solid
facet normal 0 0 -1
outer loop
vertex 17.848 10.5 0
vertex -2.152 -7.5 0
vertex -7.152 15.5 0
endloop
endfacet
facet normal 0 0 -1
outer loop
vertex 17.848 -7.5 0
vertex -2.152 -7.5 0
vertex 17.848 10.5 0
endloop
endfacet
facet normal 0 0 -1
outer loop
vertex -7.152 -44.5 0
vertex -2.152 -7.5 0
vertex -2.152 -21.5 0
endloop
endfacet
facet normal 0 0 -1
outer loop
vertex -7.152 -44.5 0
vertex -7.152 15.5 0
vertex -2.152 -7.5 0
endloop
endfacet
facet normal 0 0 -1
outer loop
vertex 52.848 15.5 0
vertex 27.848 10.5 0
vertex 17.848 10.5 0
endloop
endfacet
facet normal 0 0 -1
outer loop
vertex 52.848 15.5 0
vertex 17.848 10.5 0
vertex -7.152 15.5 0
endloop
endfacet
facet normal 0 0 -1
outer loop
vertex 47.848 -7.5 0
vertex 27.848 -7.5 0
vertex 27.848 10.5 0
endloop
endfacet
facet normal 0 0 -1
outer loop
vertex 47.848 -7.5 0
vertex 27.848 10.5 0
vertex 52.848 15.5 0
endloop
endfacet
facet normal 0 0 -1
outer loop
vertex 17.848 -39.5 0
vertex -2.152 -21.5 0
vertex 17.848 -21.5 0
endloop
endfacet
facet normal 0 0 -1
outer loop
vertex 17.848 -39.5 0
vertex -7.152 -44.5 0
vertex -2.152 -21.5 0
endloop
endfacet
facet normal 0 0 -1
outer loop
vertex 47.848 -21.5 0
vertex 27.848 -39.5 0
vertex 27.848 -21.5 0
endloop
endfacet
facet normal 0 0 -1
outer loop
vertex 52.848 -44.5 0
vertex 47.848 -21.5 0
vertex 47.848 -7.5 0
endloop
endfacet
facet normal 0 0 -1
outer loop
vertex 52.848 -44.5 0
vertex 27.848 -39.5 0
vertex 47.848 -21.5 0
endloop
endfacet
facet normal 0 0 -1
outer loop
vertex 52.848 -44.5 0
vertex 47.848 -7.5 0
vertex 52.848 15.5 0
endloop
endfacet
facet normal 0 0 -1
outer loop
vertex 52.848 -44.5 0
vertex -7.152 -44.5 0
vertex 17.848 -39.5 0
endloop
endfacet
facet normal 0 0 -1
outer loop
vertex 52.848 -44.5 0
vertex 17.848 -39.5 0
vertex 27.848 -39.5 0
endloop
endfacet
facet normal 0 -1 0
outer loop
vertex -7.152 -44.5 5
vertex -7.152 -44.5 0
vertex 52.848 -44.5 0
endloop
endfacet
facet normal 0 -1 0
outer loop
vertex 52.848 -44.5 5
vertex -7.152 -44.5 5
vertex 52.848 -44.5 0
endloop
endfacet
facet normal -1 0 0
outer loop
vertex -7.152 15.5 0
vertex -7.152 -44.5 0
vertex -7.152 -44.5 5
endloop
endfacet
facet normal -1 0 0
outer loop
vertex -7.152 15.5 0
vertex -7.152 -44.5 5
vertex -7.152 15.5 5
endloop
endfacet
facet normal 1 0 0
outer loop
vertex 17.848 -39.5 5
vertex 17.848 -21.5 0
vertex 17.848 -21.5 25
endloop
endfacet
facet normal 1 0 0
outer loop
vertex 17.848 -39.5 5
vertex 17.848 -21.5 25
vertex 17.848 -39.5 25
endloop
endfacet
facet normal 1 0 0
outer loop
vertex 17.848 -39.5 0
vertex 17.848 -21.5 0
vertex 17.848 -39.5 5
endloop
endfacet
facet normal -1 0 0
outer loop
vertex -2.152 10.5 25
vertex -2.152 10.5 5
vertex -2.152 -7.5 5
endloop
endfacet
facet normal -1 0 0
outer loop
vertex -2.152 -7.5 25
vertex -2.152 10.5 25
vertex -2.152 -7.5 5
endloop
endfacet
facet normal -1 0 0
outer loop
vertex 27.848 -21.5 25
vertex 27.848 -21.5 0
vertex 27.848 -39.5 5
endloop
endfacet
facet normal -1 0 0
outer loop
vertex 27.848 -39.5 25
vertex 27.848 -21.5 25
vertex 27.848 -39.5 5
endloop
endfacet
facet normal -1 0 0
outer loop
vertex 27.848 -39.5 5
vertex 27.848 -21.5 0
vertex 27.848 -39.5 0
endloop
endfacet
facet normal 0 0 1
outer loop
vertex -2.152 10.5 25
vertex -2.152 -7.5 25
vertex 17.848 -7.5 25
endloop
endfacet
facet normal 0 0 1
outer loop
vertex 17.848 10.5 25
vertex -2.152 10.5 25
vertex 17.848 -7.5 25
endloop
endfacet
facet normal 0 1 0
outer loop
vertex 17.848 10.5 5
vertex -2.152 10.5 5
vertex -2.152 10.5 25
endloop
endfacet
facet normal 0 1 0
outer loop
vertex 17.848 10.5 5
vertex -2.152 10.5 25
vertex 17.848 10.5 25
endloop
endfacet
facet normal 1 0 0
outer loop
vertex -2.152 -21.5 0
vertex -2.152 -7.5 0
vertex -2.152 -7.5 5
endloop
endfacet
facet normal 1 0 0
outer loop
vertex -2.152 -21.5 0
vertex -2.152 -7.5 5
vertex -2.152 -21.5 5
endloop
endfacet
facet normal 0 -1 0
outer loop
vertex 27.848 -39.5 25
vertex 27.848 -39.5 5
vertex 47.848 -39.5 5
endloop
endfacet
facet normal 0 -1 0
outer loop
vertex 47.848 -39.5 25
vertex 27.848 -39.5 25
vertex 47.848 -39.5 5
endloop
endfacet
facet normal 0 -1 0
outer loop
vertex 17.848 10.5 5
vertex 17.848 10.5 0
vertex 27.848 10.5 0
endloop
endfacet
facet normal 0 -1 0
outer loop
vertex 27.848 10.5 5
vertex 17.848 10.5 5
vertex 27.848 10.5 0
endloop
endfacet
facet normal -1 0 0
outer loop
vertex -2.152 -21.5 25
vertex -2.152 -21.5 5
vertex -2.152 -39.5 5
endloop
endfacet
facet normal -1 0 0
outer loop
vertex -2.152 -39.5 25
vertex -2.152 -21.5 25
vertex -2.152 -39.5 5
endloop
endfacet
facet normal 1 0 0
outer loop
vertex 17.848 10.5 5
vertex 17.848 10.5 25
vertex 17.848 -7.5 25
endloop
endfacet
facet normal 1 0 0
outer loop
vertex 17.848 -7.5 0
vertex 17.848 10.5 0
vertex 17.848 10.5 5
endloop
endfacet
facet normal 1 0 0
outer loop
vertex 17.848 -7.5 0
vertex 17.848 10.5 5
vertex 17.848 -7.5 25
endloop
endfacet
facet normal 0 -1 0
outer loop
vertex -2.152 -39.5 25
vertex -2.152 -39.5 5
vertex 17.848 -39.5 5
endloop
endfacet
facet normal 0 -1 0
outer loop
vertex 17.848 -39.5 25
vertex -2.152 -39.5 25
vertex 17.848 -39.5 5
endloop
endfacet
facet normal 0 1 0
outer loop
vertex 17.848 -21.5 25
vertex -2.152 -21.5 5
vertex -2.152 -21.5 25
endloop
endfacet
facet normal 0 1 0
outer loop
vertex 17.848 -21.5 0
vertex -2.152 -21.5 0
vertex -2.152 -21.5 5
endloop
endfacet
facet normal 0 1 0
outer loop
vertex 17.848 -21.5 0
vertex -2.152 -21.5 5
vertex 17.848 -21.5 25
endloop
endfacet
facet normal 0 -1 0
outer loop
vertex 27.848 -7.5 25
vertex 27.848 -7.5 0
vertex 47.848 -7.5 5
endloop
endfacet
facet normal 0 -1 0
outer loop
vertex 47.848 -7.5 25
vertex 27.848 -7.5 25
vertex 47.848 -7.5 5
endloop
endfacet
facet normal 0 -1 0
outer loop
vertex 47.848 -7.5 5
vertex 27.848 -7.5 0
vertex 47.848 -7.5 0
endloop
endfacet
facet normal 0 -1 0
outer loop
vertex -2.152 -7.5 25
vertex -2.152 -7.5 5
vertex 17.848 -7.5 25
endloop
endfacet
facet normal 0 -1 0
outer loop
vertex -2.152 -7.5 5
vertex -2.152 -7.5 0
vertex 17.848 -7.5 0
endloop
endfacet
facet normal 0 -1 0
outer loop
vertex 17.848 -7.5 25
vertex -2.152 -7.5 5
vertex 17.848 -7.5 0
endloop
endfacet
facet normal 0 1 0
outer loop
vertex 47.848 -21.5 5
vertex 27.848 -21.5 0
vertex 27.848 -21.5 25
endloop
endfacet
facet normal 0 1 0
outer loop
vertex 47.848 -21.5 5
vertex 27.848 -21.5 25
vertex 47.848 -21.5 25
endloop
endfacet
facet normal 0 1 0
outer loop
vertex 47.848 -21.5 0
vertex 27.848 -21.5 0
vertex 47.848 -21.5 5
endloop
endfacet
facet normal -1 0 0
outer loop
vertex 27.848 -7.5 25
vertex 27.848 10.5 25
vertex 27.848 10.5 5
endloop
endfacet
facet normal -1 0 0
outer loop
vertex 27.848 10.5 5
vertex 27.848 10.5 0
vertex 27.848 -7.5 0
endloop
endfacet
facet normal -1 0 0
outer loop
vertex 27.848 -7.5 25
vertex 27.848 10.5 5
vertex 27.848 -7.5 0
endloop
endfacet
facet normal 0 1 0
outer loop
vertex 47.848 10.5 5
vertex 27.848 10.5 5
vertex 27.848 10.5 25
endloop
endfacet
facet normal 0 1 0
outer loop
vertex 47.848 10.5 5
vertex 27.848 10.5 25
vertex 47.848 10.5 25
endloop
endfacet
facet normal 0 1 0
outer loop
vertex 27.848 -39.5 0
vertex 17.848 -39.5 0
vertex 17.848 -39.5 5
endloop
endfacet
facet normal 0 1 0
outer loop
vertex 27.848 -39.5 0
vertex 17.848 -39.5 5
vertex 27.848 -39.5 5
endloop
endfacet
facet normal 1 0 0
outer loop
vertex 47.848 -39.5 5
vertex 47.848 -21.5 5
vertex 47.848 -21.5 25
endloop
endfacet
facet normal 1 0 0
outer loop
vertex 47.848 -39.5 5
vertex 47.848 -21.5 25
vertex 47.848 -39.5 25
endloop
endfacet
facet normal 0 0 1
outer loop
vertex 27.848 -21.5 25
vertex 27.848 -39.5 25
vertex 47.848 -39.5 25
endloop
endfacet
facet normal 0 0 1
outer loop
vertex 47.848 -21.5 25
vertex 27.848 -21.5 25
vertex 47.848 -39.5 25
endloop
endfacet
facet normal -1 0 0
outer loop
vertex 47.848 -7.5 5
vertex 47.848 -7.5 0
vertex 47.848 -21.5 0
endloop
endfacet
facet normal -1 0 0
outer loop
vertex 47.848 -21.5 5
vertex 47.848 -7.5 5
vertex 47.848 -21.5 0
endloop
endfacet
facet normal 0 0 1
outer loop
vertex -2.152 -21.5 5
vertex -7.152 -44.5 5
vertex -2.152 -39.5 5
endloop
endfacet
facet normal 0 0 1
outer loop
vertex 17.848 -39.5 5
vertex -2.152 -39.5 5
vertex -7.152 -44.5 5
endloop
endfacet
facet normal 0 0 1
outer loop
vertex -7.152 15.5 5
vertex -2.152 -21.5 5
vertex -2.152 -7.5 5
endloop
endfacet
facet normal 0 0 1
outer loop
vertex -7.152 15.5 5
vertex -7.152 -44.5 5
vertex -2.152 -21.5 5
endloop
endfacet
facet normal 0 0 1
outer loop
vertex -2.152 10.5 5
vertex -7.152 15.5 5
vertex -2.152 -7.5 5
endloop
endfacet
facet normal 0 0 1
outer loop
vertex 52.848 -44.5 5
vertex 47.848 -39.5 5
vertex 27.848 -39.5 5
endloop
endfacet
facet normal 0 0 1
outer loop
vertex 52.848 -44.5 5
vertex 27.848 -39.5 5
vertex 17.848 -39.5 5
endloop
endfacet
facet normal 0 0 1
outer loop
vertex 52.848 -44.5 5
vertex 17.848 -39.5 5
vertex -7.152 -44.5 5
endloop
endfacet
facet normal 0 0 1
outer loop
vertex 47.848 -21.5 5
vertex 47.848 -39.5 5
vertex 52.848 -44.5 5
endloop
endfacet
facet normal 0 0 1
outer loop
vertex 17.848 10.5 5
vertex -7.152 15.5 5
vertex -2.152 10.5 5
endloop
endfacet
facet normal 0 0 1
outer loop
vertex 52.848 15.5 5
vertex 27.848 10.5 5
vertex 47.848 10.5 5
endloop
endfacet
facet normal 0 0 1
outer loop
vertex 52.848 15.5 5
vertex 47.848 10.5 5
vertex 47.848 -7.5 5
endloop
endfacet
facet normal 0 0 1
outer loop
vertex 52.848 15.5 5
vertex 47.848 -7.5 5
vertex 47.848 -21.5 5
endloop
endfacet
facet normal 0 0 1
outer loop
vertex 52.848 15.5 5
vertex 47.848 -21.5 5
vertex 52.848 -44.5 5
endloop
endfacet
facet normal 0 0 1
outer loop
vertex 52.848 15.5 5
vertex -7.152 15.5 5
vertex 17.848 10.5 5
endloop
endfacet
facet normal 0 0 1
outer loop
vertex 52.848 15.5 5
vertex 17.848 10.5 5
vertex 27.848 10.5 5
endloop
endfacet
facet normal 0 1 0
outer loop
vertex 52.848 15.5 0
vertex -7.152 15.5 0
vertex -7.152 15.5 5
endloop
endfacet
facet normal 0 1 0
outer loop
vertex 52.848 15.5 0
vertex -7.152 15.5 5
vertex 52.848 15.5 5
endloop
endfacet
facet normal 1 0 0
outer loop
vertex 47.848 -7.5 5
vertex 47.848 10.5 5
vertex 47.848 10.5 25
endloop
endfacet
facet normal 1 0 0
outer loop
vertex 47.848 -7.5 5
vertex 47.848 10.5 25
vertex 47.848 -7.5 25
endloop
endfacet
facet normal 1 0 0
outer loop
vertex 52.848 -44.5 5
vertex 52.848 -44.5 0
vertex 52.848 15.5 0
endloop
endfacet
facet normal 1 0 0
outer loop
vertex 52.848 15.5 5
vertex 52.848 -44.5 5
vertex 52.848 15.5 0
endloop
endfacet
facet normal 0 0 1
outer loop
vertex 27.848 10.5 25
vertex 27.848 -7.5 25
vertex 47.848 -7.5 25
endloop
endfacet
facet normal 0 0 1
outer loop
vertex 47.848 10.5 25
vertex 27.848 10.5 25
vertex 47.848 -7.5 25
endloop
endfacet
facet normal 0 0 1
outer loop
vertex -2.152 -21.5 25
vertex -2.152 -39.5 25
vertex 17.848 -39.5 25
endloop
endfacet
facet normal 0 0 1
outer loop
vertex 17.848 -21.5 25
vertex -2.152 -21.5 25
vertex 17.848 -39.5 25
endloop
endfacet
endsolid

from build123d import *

# Parameters (mm, degrees)
SKETCH_W           = 60
SKETCH_H           = 60
PAD_DEPTH          = 5
COPYSKETCH001_W    = 50
COPYSKETCH001_H    = 50
POCKET_DEPTH       = 11
COPYSKETCH002001_W = 20
COPYSKETCH002001_H = 18
PAD001_DEPTH       = 25


with BuildPart() as part:
    # Sketch → Pad (new body)
    with BuildSketch(Plane.XY):
        with Locations((22.847713, -14.499916)):
            Rectangle(SKETCH_W, SKETCH_H)
    extrude(amount=PAD_DEPTH)

    # CopySketch001 → Pocket (cut)
    with BuildSketch(Plane(origin=(0, 0, 0), x_dir=(1, 0, 0), z_dir=(0, 0, -1))):
        with Locations((22.847713, 14.499916)):
            Rectangle(COPYSKETCH001_W, COPYSKETCH001_H)
    extrude(amount=-POCKET_DEPTH, mode=Mode.SUBTRACT)

    # CopySketch002001 → Pad001 (join)
    with BuildSketch(Plane(origin=(0, 0, 0), x_dir=(1, 0, 0), z_dir=(0, 0, -1))):
        with Locations((7.847713, 30.499916)):
            Rectangle(COPYSKETCH002001_W, COPYSKETCH002001_H)
        with Locations((37.847713, 30.499916)):
            Rectangle(COPYSKETCH002001_W, COPYSKETCH002001_H)
        with Locations((37.847713, -1.500084)):
            Rectangle(COPYSKETCH002001_W, COPYSKETCH002001_H)
        with Locations((7.847713, -1.500084)):
            Rectangle(COPYSKETCH002001_W, COPYSKETCH002001_H)
    extrude(amount=-PAD001_DEPTH)


solid = part.part
